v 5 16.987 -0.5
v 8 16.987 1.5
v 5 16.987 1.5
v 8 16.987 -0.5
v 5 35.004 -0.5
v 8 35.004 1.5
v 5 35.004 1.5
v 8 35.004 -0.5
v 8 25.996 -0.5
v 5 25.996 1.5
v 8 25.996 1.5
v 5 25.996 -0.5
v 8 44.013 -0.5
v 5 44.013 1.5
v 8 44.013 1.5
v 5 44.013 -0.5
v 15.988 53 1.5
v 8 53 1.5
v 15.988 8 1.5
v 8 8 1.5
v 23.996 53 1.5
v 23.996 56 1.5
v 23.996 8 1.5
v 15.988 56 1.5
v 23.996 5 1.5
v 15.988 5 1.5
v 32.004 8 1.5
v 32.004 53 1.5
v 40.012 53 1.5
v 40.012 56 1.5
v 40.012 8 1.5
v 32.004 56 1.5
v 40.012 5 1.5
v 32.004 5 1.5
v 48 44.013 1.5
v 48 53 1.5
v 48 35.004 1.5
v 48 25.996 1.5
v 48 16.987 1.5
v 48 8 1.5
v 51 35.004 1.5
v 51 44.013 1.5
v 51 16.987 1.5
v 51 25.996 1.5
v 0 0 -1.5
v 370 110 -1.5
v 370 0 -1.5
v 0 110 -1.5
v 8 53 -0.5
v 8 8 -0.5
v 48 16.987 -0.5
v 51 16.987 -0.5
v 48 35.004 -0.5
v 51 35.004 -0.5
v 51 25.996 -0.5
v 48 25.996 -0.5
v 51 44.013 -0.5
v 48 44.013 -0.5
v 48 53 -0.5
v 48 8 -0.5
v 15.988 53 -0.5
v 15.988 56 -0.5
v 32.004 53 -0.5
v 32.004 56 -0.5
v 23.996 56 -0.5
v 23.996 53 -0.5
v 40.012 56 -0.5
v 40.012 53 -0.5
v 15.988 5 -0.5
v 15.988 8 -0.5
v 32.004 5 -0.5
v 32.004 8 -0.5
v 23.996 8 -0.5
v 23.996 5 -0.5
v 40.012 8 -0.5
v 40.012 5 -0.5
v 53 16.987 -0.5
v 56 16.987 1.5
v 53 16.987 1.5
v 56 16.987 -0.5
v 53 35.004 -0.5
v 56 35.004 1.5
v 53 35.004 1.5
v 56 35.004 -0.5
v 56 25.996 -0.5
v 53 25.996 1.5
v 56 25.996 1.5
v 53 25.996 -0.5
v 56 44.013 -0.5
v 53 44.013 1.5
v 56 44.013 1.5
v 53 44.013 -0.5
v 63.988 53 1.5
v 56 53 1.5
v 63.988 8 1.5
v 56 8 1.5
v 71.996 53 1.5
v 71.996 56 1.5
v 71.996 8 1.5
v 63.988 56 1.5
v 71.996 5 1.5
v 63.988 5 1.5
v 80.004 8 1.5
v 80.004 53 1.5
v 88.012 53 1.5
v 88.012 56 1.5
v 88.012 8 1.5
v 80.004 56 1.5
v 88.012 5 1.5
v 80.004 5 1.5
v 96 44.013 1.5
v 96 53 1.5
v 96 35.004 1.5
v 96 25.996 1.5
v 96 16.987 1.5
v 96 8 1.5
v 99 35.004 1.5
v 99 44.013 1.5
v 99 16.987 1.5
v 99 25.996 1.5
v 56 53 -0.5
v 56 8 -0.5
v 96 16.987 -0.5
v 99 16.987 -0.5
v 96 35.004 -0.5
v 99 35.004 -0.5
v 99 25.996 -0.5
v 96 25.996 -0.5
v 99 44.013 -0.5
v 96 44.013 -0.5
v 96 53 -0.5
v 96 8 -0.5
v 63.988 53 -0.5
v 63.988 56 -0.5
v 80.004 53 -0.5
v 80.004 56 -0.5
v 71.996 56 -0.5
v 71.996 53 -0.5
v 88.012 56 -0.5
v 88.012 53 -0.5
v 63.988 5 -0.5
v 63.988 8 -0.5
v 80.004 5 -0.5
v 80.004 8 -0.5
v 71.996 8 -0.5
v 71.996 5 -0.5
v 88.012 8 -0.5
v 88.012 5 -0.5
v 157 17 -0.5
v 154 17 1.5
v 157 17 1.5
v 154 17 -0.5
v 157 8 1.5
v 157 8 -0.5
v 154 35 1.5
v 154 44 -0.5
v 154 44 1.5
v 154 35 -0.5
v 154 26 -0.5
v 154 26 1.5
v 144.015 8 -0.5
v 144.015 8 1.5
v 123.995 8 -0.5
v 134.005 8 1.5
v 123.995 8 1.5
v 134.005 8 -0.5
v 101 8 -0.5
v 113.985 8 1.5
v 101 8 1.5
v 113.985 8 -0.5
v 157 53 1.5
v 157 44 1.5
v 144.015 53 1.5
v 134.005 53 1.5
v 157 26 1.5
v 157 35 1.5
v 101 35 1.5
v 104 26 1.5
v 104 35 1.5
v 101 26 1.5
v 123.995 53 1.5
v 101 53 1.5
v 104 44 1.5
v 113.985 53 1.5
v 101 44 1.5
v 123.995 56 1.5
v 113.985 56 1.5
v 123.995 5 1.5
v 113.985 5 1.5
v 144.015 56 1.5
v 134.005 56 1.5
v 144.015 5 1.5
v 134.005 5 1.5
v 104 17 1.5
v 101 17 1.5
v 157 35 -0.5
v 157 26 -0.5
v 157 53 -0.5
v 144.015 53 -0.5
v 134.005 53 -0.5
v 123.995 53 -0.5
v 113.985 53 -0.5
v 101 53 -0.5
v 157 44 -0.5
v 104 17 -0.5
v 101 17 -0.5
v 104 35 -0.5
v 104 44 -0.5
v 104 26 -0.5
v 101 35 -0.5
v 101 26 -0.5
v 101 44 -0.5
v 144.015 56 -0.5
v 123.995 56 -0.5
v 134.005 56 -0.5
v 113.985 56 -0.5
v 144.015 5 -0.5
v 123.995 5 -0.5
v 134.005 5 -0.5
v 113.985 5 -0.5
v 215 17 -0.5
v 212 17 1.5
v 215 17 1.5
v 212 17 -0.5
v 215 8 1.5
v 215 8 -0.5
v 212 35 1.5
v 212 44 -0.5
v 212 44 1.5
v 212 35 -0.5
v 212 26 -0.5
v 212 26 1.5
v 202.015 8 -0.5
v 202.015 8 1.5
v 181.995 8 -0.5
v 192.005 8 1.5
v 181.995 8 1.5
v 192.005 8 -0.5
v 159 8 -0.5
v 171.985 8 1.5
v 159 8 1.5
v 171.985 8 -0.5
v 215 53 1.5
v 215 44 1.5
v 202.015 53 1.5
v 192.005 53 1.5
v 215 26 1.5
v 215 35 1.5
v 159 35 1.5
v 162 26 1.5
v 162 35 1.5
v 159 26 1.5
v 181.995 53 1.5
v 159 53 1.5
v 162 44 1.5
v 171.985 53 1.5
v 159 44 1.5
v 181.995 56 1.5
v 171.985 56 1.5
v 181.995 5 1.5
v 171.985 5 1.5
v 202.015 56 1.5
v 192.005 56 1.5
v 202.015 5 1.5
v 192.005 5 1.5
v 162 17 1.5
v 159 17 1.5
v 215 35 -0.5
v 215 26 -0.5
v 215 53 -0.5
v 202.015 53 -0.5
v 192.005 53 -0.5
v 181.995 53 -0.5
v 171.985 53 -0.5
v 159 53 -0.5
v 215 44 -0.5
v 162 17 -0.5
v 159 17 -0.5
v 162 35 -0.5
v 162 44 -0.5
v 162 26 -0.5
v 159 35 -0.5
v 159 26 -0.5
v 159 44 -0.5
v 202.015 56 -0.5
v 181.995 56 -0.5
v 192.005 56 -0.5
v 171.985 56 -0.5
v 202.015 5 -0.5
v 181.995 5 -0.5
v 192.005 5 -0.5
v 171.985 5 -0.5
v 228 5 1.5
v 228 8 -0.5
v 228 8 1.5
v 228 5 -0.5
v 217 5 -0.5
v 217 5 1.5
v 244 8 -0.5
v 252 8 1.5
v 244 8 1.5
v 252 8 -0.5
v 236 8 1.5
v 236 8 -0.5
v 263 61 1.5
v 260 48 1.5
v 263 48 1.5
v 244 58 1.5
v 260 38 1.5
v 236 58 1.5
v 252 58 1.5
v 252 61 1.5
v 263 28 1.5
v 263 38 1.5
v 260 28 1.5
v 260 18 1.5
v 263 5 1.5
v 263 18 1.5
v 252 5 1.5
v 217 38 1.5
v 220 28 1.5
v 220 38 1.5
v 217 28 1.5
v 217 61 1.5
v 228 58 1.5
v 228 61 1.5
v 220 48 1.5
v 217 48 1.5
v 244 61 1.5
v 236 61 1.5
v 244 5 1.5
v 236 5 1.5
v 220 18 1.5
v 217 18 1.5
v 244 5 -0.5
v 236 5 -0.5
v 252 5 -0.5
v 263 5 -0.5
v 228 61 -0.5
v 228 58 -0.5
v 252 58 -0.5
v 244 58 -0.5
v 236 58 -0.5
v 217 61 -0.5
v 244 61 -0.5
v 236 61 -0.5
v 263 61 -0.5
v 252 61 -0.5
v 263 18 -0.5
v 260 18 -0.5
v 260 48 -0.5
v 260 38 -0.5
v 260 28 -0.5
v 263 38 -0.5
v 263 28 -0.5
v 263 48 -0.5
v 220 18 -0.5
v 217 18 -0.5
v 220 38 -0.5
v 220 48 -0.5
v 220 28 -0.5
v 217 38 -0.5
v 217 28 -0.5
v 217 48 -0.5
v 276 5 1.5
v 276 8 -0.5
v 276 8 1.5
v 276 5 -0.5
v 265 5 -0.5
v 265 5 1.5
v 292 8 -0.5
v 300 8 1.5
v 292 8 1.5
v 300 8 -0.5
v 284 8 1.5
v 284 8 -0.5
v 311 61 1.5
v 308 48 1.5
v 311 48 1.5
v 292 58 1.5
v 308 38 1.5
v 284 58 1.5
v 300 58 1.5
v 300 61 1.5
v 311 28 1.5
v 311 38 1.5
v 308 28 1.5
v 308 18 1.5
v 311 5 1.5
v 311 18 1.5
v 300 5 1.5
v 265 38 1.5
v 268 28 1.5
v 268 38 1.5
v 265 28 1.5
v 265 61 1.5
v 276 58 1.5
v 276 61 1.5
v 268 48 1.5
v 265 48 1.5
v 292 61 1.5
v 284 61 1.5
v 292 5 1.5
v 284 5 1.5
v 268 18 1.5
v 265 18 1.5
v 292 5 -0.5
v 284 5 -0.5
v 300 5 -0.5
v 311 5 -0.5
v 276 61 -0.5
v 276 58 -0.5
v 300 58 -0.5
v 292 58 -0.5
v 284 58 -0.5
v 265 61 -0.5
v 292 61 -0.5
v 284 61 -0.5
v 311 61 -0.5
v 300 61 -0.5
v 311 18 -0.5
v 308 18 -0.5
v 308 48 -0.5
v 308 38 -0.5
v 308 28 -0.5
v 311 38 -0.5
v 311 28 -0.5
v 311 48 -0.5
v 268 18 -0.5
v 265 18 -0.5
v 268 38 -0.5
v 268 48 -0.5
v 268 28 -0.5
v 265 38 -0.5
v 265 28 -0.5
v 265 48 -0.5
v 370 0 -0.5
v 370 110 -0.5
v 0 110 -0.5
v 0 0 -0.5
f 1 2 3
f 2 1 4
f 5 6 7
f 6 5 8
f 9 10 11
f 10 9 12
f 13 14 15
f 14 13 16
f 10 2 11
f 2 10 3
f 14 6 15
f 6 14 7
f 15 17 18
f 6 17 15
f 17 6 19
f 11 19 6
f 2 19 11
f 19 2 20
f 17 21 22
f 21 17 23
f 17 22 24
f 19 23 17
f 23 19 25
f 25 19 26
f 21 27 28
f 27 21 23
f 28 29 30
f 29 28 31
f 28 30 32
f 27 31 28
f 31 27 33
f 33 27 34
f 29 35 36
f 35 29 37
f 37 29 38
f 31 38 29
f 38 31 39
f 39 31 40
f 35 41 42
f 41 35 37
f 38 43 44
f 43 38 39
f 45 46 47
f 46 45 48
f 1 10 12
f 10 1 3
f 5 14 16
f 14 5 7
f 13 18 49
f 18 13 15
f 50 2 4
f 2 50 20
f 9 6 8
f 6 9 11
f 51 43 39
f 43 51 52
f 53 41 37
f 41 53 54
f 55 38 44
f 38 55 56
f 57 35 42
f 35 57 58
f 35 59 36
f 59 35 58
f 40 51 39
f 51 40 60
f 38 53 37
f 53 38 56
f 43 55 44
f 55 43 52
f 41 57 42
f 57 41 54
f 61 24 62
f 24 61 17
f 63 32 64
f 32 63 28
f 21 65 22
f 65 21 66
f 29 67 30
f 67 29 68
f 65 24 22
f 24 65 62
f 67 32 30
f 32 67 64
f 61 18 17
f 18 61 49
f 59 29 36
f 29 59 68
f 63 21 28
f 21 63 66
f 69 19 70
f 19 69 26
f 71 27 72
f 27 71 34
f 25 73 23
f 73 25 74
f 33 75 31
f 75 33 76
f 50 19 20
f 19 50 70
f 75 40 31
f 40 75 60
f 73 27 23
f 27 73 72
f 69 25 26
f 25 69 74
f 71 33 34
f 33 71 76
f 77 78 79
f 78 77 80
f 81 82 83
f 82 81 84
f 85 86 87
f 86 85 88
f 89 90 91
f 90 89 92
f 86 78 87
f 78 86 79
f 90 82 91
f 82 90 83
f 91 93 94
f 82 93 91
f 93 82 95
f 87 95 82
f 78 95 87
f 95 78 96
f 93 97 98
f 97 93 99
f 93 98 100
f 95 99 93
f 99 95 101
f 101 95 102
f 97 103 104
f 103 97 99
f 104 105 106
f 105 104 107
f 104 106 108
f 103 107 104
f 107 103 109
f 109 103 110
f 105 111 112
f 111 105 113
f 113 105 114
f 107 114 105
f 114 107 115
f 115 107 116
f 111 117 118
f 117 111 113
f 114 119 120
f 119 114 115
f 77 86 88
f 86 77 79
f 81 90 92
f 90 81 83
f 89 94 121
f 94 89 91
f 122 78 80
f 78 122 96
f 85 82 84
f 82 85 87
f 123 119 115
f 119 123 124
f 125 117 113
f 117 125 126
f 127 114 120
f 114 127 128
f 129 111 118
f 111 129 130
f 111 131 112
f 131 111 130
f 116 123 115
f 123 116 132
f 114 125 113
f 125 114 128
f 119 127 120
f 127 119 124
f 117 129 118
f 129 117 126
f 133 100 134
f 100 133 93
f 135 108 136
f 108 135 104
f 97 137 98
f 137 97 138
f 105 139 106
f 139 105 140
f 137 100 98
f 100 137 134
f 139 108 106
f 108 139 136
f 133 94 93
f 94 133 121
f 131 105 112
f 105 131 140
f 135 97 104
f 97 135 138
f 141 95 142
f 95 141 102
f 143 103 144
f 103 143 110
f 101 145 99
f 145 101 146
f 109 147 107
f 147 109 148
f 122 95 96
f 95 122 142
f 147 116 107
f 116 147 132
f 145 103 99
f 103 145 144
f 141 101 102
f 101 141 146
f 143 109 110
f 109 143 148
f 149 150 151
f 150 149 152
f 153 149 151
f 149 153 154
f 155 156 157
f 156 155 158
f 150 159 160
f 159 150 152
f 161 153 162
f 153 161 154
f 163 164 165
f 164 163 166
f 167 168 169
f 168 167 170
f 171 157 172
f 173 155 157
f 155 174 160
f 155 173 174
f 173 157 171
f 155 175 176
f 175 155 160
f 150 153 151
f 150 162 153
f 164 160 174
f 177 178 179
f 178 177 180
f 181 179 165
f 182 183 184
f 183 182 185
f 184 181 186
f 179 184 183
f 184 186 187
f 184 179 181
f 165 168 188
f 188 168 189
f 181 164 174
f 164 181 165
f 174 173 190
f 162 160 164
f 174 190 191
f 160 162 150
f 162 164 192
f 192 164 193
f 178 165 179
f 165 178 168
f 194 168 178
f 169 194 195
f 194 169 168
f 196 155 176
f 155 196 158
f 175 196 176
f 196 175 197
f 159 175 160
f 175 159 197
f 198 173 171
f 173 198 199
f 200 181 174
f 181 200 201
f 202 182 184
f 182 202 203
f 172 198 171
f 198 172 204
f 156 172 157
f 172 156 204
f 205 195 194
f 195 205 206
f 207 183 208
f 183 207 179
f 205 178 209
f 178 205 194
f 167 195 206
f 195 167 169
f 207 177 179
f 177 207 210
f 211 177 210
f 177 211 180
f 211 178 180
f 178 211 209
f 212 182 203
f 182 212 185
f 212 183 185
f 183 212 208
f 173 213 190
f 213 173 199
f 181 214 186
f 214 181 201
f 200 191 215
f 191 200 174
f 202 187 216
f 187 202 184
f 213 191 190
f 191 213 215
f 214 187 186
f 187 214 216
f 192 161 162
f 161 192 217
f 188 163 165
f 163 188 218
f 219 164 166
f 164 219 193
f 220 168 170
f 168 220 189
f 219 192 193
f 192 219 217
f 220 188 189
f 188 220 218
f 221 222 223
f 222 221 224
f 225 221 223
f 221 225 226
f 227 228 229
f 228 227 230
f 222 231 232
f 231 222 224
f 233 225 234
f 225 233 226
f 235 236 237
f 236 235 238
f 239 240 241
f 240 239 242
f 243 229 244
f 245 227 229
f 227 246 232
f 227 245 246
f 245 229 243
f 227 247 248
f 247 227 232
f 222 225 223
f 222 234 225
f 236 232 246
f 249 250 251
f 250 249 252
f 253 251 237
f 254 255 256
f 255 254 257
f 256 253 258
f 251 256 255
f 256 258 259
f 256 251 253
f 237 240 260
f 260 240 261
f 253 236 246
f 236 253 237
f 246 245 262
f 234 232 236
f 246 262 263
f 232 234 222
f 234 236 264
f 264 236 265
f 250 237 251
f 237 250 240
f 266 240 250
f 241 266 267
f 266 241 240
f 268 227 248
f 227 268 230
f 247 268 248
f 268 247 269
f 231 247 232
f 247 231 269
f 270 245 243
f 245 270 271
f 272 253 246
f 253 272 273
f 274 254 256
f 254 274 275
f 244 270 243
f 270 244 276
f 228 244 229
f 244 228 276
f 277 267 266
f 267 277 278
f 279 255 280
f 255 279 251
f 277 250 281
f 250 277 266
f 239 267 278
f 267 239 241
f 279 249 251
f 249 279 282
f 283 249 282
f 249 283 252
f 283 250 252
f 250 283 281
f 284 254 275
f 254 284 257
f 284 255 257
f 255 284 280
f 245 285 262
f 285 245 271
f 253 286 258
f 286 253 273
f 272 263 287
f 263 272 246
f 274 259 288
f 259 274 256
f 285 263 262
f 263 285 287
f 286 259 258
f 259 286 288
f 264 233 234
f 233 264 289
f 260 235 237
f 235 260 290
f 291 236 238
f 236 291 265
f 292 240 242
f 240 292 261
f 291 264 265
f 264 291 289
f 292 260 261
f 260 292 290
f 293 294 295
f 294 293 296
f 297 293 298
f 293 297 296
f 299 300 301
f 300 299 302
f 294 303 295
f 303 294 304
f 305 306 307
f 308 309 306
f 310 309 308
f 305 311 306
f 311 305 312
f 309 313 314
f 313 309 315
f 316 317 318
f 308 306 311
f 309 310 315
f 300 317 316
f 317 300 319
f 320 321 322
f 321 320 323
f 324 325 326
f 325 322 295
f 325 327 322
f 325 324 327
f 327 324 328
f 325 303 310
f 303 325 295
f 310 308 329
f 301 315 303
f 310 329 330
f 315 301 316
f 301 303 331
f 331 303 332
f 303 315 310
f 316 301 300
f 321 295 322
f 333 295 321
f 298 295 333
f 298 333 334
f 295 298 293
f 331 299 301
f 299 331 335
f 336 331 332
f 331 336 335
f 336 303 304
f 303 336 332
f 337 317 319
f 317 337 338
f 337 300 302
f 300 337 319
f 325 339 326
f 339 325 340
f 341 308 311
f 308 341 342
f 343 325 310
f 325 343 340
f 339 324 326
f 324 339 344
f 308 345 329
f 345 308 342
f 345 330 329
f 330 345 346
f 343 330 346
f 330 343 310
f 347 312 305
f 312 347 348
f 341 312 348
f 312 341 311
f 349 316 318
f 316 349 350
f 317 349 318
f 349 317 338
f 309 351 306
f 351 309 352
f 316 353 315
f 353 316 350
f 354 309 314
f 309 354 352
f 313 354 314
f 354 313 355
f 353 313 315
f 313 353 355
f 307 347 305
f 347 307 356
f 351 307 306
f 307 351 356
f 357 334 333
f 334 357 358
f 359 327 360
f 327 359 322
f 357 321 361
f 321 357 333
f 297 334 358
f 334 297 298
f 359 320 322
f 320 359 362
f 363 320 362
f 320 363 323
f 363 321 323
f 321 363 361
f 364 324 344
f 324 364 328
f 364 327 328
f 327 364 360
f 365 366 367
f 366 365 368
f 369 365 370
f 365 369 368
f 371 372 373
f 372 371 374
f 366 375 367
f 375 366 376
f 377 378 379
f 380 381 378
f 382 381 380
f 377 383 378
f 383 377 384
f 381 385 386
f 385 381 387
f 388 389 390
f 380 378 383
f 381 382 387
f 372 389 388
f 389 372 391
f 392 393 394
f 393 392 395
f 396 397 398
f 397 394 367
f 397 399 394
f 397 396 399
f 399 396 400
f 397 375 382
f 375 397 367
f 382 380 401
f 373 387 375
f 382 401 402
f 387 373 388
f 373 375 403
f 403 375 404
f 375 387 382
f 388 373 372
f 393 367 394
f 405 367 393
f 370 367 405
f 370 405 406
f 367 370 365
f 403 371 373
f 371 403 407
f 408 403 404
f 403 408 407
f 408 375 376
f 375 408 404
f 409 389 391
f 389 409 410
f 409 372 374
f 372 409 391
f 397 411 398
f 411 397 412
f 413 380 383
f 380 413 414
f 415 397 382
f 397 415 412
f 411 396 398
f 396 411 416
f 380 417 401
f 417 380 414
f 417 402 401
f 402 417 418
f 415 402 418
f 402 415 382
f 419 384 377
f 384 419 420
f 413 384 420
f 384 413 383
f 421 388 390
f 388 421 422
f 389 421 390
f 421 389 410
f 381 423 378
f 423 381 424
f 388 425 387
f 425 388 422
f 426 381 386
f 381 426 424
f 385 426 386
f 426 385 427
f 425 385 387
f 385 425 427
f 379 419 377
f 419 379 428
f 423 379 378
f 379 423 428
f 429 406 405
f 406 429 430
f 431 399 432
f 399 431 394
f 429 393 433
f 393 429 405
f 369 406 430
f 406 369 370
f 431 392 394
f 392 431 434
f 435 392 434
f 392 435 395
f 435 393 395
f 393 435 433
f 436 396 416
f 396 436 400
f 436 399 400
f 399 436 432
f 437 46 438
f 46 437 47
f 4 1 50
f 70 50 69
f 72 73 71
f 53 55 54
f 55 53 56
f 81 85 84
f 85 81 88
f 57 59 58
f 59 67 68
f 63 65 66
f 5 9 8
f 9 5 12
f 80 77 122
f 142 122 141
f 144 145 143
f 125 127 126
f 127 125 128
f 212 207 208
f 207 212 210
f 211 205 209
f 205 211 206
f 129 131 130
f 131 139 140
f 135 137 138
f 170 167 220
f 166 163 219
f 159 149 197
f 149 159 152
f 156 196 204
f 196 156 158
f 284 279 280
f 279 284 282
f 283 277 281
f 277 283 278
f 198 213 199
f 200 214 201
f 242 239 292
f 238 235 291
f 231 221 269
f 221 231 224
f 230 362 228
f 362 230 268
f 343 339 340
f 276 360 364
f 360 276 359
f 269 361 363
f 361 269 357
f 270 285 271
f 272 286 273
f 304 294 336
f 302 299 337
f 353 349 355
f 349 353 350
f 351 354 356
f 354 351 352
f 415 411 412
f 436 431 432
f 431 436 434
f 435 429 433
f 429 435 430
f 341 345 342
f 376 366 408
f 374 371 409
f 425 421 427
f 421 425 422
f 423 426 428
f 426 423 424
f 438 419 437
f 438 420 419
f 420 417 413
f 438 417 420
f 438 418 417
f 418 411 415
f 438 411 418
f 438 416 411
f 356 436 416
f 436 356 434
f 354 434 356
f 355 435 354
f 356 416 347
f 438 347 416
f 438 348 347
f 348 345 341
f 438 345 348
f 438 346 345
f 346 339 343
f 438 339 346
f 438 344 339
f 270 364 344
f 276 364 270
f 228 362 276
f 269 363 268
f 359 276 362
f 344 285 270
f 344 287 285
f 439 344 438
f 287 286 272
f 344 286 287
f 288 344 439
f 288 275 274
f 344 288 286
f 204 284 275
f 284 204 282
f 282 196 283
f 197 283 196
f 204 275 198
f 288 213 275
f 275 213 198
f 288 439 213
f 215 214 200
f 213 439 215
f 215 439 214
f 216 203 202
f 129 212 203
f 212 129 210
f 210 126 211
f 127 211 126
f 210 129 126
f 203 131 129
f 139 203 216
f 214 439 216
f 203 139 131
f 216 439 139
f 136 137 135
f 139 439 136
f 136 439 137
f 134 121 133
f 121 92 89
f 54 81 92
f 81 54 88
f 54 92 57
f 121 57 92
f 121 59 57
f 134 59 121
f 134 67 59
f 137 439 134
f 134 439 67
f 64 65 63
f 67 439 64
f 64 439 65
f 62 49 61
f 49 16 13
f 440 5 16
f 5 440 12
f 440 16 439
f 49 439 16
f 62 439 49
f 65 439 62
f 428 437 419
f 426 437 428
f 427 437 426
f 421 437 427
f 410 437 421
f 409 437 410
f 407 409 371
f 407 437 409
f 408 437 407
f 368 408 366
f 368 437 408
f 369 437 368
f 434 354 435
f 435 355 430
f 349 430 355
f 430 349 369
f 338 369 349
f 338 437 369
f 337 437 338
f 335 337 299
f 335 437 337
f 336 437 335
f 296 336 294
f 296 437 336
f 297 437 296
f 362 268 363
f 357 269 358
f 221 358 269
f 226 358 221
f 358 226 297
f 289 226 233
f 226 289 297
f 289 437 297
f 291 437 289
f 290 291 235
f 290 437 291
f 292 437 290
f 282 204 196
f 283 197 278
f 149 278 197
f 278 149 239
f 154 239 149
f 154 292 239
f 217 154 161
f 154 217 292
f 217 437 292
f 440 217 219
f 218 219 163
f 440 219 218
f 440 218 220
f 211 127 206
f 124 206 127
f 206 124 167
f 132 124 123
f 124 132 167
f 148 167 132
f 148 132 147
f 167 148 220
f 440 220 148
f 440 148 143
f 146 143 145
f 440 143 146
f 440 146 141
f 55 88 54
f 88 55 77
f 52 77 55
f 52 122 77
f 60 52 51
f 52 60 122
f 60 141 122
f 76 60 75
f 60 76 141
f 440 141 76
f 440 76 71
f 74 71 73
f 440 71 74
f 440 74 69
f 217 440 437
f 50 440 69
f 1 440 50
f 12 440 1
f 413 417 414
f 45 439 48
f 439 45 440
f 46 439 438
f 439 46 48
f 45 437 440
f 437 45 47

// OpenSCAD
// file: noses.scad
include <config.scad>;

/**
 * Generates configured number of noses
 * centered, along X axis, to normalized total length of 1
 */
module nose_positive()
{
    begin_x = -0.5;
    delta_x = (1-relative_nose_length) / (nose_count-1);
    for (i=[0:nose_count-1])
    {
        translate([
            begin_x + i*delta_x,
            -material_z/2,
            -material_z/2
            ])
        cube([
            relative_nose_length,
            material_z,
            material_z
            ]);
    }
}

/**
 * Generates the counterpart to nose_positive()
 */
module nose_negative()
{
    // subtract nose_positive() from centered cuboid
    difference()
    {
        translate([
            -0.5,
            -material_z/2,
            -material_z/2
            ])
        cube([
            1,
            material_z,
            material_z
            ]);
        // a little overscale to get rid of rendering artifacts
        scale([
            1.001,
            1.001,
            1.001
            ])
        nose_positive();
    }
}

nose_negative();
// file: face_xz.scad
include <config.scad>;
use <noses.scad>;

/**
 * Generate the top and bottom face of the cuboid
 * with noses, centered around origin
 */
module face_xz()
{
    color("green")
    {
        cube([
            cuboid_x,
            material_z,
            cuboid_z
            ], center=true);

        scale([
            cuboid_x,
            1,
            1
            ])
        {
            translate([
                0,
                0,
                cuboid_z_2 + material_z_2
                ])
            nose_positive();

            translate([
                0,
                0,
                - cuboid_z_2 - material_z_2,
                ])
            nose_positive();
        }

        rotate([
            0,
            90,
            0
            ])
        scale([
            cuboid_z,
            1,
            1
            ])
        {
            translate([
                0,
                0,
                cuboid_x_2 + material_z_2
                ])
            nose_positive();

            translate([
                0,
                0,
                - cuboid_x_2 - material_z_2
                ])
            nose_positive();
        }

        /*
         * fill the corners
         */
        translate([
            - cuboid_x_2 - material_z_2,
            0,
            - cuboid_z_2 - material_z_2
            ])
        cube([
            material_z,
            material_z,
            material_z
            ], center=true);

        translate([
            - cuboid_x_2 - material_z_2,
            0,
            + cuboid_z_2 + material_z_2
            ])
        cube([
            material_z,
            material_z,
            material_z
            ], center=true);

        translate([
            + cuboid_x_2 + material_z_2,
            0,
            + cuboid_z_2 + material_z_2
            ])
        cube([
            material_z,
            material_z,
            material_z
            ], center=true);

        translate([
            + cuboid_x_2 + material_z_2,
            0,
            - cuboid_z_2 - material_z_2
            ])
        cube([
            material_z,
            material_z,
            material_z
            ], center=true);
    }
}

face_xz();
// file: face_yz.scad
include <config.scad>;
use <noses.scad>;

/**
 * Generate the top and bottom face of the cuboid
 * with noses, centered around origin
 */
module face_yz()
{
    color("red")
    {
        cube([
            material_z,
            cuboid_y,
            cuboid_z,
            ], center=true);

        rotate([
            0,
            0,
            90
            ])
        scale([
            cuboid_y,
            1,
            1
            ])
        {
            translate([
                0,
                0,
                cuboid_z_2 + material_z_2
                ])
            nose_positive();

            translate([
                0,
                0,
                - cuboid_z_2 - material_z_2
                ])
            nose_positive();
        }

        rotate([
            0,
            90,
            0
            ])
        scale([
            cuboid_z,
            1,
            1
            ])
        {
            translate([
                0,
                cuboid_y_2 + material_z_2,
                0
                ])
            nose_negative();

            translate([
                0,
                - cuboid_y_2 - material_z_2,
                0
                ])
            nose_negative();
        }
    }
}

face_yz();
// file: face_xy.scad
include <config.scad>;
use <noses.scad>;

/**
 * Generate the top and bottom face of the cuboid
 * with noses, centered around origin
 */
module face_xy()
{
    color("blue")
    {
        cube([
            cuboid_x,
            cuboid_y,
            material_z
            ], center=true);

        rotate([
            0,
            0,
            90
            ])
        scale([
            cuboid_y,
            1,
            1
            ])
        {
            translate([
                0,
                cuboid_x_2 + material_z_2,
                0
                ])
            nose_negative();

            translate([
                0,
                - cuboid_x_2 - material_z_2,
                0
                ])
            nose_negative();
        }

        scale([
            cuboid_x,
            1,
            1
            ])
        {
            translate([
                0,
                cuboid_y_2 + material_z_2,
                0
                ])
            nose_negative();

            translate([
                0,
                - cuboid_y_2 - material_z_2,
                0
                ])
            nose_negative();
        }
    }
}

face_xy();
// file: config.scad
// all measures in mm

/*
 * Base material to cut from
 */
material_x = 370;
material_y = 110;
material_z = 3;

/*
 * Shark model measures
 */
shark_length = 100;

/*
 * Cuboid measures (inside)
 */
/*
cuboid_x = shark_length / 2;
cuboid_y = cuboid_x+20;
cuboid_z = cuboid_x+40;
*/
cuboid_x = 40;
cuboid_y = 45;
cuboid_z = 50;

/*
 * Save some calculations
 */
cuboid_x_2 = cuboid_x / 2;
cuboid_y_2 = cuboid_y / 2;
cuboid_z_2 = cuboid_z / 2;
material_z_2 = material_z / 2;

/*
 * Nose properties
 */
// the number
nose_count = 3;
// width of a nose relative to length of the corresponding edge
relative_nose_length = 0.2;

/*
 * Rendering and projection properties
 */
// how far apart from on another to project the parts
projection_spacing = 2;
// how far from the border of the material to begin placing
projection_margin = 5;
// rendering quality (face number)
$fn = 50;
// main file
include <config.scad>;
use <face_xy.scad>;
use <face_yz.scad>;
use <face_xz.scad>;

module base_material()
{
    color("grey")
    translate([
        0,
        0,
        -1.5
        ])
    cube([
        material_x,
        material_y,
        1
        ]);
}

module layout()
{
    // vertical "cursor"
    a =  projection_margin;

    translate([
        cuboid_x_2 + material_z + a,
        cuboid_y_2 + material_z + projection_margin,
        0
        ])
    face_xy();
    b = a + cuboid_x + 2*material_z + projection_spacing;

    translate([
        cuboid_x_2 + material_z + b,
        cuboid_y_2 + material_z + projection_margin,
        0
        ])
    face_xy();
    c = b + cuboid_x + 2*material_z + projection_spacing;

    // model's z axis is now x
    translate([
        cuboid_z_2 + material_z + c,
        cuboid_y_2 + material_z + projection_margin,
        0
        ])
    // rotate into xy-plane
    rotate([
        0,
        90,
        0
        ])
    face_yz();
    d = c + cuboid_z + 2*material_z + projection_spacing;

    // model's z axis is now x
    translate([
        cuboid_z_2 + material_z + d,
        cuboid_y_2 + material_z + projection_margin,
        0
        ])
    // rotate into xy-plane
    rotate([
        0,
        90,
        0
        ])
    face_yz();
    e = d + cuboid_z + 2*material_z + projection_spacing;

    // model's z axis is now y
    translate([
        cuboid_x_2 + material_z + e,
        cuboid_z_2 + material_z + projection_margin,
        0
        ])
    // rotate into xy-plane
    rotate([
        90,
        0,
        0
        ])
    face_xz();
    f = e + cuboid_x + 2*material_z + projection_spacing;

    // model's z axis is now y
    translate([
        cuboid_x_2 + material_z + f,
        cuboid_z_2 + material_z + projection_margin,
        0
        ])
    // rotate into xy-plane
    rotate([
        90,
        0,
        0
        ])
    face_xz();
}

base_material();
layout();
